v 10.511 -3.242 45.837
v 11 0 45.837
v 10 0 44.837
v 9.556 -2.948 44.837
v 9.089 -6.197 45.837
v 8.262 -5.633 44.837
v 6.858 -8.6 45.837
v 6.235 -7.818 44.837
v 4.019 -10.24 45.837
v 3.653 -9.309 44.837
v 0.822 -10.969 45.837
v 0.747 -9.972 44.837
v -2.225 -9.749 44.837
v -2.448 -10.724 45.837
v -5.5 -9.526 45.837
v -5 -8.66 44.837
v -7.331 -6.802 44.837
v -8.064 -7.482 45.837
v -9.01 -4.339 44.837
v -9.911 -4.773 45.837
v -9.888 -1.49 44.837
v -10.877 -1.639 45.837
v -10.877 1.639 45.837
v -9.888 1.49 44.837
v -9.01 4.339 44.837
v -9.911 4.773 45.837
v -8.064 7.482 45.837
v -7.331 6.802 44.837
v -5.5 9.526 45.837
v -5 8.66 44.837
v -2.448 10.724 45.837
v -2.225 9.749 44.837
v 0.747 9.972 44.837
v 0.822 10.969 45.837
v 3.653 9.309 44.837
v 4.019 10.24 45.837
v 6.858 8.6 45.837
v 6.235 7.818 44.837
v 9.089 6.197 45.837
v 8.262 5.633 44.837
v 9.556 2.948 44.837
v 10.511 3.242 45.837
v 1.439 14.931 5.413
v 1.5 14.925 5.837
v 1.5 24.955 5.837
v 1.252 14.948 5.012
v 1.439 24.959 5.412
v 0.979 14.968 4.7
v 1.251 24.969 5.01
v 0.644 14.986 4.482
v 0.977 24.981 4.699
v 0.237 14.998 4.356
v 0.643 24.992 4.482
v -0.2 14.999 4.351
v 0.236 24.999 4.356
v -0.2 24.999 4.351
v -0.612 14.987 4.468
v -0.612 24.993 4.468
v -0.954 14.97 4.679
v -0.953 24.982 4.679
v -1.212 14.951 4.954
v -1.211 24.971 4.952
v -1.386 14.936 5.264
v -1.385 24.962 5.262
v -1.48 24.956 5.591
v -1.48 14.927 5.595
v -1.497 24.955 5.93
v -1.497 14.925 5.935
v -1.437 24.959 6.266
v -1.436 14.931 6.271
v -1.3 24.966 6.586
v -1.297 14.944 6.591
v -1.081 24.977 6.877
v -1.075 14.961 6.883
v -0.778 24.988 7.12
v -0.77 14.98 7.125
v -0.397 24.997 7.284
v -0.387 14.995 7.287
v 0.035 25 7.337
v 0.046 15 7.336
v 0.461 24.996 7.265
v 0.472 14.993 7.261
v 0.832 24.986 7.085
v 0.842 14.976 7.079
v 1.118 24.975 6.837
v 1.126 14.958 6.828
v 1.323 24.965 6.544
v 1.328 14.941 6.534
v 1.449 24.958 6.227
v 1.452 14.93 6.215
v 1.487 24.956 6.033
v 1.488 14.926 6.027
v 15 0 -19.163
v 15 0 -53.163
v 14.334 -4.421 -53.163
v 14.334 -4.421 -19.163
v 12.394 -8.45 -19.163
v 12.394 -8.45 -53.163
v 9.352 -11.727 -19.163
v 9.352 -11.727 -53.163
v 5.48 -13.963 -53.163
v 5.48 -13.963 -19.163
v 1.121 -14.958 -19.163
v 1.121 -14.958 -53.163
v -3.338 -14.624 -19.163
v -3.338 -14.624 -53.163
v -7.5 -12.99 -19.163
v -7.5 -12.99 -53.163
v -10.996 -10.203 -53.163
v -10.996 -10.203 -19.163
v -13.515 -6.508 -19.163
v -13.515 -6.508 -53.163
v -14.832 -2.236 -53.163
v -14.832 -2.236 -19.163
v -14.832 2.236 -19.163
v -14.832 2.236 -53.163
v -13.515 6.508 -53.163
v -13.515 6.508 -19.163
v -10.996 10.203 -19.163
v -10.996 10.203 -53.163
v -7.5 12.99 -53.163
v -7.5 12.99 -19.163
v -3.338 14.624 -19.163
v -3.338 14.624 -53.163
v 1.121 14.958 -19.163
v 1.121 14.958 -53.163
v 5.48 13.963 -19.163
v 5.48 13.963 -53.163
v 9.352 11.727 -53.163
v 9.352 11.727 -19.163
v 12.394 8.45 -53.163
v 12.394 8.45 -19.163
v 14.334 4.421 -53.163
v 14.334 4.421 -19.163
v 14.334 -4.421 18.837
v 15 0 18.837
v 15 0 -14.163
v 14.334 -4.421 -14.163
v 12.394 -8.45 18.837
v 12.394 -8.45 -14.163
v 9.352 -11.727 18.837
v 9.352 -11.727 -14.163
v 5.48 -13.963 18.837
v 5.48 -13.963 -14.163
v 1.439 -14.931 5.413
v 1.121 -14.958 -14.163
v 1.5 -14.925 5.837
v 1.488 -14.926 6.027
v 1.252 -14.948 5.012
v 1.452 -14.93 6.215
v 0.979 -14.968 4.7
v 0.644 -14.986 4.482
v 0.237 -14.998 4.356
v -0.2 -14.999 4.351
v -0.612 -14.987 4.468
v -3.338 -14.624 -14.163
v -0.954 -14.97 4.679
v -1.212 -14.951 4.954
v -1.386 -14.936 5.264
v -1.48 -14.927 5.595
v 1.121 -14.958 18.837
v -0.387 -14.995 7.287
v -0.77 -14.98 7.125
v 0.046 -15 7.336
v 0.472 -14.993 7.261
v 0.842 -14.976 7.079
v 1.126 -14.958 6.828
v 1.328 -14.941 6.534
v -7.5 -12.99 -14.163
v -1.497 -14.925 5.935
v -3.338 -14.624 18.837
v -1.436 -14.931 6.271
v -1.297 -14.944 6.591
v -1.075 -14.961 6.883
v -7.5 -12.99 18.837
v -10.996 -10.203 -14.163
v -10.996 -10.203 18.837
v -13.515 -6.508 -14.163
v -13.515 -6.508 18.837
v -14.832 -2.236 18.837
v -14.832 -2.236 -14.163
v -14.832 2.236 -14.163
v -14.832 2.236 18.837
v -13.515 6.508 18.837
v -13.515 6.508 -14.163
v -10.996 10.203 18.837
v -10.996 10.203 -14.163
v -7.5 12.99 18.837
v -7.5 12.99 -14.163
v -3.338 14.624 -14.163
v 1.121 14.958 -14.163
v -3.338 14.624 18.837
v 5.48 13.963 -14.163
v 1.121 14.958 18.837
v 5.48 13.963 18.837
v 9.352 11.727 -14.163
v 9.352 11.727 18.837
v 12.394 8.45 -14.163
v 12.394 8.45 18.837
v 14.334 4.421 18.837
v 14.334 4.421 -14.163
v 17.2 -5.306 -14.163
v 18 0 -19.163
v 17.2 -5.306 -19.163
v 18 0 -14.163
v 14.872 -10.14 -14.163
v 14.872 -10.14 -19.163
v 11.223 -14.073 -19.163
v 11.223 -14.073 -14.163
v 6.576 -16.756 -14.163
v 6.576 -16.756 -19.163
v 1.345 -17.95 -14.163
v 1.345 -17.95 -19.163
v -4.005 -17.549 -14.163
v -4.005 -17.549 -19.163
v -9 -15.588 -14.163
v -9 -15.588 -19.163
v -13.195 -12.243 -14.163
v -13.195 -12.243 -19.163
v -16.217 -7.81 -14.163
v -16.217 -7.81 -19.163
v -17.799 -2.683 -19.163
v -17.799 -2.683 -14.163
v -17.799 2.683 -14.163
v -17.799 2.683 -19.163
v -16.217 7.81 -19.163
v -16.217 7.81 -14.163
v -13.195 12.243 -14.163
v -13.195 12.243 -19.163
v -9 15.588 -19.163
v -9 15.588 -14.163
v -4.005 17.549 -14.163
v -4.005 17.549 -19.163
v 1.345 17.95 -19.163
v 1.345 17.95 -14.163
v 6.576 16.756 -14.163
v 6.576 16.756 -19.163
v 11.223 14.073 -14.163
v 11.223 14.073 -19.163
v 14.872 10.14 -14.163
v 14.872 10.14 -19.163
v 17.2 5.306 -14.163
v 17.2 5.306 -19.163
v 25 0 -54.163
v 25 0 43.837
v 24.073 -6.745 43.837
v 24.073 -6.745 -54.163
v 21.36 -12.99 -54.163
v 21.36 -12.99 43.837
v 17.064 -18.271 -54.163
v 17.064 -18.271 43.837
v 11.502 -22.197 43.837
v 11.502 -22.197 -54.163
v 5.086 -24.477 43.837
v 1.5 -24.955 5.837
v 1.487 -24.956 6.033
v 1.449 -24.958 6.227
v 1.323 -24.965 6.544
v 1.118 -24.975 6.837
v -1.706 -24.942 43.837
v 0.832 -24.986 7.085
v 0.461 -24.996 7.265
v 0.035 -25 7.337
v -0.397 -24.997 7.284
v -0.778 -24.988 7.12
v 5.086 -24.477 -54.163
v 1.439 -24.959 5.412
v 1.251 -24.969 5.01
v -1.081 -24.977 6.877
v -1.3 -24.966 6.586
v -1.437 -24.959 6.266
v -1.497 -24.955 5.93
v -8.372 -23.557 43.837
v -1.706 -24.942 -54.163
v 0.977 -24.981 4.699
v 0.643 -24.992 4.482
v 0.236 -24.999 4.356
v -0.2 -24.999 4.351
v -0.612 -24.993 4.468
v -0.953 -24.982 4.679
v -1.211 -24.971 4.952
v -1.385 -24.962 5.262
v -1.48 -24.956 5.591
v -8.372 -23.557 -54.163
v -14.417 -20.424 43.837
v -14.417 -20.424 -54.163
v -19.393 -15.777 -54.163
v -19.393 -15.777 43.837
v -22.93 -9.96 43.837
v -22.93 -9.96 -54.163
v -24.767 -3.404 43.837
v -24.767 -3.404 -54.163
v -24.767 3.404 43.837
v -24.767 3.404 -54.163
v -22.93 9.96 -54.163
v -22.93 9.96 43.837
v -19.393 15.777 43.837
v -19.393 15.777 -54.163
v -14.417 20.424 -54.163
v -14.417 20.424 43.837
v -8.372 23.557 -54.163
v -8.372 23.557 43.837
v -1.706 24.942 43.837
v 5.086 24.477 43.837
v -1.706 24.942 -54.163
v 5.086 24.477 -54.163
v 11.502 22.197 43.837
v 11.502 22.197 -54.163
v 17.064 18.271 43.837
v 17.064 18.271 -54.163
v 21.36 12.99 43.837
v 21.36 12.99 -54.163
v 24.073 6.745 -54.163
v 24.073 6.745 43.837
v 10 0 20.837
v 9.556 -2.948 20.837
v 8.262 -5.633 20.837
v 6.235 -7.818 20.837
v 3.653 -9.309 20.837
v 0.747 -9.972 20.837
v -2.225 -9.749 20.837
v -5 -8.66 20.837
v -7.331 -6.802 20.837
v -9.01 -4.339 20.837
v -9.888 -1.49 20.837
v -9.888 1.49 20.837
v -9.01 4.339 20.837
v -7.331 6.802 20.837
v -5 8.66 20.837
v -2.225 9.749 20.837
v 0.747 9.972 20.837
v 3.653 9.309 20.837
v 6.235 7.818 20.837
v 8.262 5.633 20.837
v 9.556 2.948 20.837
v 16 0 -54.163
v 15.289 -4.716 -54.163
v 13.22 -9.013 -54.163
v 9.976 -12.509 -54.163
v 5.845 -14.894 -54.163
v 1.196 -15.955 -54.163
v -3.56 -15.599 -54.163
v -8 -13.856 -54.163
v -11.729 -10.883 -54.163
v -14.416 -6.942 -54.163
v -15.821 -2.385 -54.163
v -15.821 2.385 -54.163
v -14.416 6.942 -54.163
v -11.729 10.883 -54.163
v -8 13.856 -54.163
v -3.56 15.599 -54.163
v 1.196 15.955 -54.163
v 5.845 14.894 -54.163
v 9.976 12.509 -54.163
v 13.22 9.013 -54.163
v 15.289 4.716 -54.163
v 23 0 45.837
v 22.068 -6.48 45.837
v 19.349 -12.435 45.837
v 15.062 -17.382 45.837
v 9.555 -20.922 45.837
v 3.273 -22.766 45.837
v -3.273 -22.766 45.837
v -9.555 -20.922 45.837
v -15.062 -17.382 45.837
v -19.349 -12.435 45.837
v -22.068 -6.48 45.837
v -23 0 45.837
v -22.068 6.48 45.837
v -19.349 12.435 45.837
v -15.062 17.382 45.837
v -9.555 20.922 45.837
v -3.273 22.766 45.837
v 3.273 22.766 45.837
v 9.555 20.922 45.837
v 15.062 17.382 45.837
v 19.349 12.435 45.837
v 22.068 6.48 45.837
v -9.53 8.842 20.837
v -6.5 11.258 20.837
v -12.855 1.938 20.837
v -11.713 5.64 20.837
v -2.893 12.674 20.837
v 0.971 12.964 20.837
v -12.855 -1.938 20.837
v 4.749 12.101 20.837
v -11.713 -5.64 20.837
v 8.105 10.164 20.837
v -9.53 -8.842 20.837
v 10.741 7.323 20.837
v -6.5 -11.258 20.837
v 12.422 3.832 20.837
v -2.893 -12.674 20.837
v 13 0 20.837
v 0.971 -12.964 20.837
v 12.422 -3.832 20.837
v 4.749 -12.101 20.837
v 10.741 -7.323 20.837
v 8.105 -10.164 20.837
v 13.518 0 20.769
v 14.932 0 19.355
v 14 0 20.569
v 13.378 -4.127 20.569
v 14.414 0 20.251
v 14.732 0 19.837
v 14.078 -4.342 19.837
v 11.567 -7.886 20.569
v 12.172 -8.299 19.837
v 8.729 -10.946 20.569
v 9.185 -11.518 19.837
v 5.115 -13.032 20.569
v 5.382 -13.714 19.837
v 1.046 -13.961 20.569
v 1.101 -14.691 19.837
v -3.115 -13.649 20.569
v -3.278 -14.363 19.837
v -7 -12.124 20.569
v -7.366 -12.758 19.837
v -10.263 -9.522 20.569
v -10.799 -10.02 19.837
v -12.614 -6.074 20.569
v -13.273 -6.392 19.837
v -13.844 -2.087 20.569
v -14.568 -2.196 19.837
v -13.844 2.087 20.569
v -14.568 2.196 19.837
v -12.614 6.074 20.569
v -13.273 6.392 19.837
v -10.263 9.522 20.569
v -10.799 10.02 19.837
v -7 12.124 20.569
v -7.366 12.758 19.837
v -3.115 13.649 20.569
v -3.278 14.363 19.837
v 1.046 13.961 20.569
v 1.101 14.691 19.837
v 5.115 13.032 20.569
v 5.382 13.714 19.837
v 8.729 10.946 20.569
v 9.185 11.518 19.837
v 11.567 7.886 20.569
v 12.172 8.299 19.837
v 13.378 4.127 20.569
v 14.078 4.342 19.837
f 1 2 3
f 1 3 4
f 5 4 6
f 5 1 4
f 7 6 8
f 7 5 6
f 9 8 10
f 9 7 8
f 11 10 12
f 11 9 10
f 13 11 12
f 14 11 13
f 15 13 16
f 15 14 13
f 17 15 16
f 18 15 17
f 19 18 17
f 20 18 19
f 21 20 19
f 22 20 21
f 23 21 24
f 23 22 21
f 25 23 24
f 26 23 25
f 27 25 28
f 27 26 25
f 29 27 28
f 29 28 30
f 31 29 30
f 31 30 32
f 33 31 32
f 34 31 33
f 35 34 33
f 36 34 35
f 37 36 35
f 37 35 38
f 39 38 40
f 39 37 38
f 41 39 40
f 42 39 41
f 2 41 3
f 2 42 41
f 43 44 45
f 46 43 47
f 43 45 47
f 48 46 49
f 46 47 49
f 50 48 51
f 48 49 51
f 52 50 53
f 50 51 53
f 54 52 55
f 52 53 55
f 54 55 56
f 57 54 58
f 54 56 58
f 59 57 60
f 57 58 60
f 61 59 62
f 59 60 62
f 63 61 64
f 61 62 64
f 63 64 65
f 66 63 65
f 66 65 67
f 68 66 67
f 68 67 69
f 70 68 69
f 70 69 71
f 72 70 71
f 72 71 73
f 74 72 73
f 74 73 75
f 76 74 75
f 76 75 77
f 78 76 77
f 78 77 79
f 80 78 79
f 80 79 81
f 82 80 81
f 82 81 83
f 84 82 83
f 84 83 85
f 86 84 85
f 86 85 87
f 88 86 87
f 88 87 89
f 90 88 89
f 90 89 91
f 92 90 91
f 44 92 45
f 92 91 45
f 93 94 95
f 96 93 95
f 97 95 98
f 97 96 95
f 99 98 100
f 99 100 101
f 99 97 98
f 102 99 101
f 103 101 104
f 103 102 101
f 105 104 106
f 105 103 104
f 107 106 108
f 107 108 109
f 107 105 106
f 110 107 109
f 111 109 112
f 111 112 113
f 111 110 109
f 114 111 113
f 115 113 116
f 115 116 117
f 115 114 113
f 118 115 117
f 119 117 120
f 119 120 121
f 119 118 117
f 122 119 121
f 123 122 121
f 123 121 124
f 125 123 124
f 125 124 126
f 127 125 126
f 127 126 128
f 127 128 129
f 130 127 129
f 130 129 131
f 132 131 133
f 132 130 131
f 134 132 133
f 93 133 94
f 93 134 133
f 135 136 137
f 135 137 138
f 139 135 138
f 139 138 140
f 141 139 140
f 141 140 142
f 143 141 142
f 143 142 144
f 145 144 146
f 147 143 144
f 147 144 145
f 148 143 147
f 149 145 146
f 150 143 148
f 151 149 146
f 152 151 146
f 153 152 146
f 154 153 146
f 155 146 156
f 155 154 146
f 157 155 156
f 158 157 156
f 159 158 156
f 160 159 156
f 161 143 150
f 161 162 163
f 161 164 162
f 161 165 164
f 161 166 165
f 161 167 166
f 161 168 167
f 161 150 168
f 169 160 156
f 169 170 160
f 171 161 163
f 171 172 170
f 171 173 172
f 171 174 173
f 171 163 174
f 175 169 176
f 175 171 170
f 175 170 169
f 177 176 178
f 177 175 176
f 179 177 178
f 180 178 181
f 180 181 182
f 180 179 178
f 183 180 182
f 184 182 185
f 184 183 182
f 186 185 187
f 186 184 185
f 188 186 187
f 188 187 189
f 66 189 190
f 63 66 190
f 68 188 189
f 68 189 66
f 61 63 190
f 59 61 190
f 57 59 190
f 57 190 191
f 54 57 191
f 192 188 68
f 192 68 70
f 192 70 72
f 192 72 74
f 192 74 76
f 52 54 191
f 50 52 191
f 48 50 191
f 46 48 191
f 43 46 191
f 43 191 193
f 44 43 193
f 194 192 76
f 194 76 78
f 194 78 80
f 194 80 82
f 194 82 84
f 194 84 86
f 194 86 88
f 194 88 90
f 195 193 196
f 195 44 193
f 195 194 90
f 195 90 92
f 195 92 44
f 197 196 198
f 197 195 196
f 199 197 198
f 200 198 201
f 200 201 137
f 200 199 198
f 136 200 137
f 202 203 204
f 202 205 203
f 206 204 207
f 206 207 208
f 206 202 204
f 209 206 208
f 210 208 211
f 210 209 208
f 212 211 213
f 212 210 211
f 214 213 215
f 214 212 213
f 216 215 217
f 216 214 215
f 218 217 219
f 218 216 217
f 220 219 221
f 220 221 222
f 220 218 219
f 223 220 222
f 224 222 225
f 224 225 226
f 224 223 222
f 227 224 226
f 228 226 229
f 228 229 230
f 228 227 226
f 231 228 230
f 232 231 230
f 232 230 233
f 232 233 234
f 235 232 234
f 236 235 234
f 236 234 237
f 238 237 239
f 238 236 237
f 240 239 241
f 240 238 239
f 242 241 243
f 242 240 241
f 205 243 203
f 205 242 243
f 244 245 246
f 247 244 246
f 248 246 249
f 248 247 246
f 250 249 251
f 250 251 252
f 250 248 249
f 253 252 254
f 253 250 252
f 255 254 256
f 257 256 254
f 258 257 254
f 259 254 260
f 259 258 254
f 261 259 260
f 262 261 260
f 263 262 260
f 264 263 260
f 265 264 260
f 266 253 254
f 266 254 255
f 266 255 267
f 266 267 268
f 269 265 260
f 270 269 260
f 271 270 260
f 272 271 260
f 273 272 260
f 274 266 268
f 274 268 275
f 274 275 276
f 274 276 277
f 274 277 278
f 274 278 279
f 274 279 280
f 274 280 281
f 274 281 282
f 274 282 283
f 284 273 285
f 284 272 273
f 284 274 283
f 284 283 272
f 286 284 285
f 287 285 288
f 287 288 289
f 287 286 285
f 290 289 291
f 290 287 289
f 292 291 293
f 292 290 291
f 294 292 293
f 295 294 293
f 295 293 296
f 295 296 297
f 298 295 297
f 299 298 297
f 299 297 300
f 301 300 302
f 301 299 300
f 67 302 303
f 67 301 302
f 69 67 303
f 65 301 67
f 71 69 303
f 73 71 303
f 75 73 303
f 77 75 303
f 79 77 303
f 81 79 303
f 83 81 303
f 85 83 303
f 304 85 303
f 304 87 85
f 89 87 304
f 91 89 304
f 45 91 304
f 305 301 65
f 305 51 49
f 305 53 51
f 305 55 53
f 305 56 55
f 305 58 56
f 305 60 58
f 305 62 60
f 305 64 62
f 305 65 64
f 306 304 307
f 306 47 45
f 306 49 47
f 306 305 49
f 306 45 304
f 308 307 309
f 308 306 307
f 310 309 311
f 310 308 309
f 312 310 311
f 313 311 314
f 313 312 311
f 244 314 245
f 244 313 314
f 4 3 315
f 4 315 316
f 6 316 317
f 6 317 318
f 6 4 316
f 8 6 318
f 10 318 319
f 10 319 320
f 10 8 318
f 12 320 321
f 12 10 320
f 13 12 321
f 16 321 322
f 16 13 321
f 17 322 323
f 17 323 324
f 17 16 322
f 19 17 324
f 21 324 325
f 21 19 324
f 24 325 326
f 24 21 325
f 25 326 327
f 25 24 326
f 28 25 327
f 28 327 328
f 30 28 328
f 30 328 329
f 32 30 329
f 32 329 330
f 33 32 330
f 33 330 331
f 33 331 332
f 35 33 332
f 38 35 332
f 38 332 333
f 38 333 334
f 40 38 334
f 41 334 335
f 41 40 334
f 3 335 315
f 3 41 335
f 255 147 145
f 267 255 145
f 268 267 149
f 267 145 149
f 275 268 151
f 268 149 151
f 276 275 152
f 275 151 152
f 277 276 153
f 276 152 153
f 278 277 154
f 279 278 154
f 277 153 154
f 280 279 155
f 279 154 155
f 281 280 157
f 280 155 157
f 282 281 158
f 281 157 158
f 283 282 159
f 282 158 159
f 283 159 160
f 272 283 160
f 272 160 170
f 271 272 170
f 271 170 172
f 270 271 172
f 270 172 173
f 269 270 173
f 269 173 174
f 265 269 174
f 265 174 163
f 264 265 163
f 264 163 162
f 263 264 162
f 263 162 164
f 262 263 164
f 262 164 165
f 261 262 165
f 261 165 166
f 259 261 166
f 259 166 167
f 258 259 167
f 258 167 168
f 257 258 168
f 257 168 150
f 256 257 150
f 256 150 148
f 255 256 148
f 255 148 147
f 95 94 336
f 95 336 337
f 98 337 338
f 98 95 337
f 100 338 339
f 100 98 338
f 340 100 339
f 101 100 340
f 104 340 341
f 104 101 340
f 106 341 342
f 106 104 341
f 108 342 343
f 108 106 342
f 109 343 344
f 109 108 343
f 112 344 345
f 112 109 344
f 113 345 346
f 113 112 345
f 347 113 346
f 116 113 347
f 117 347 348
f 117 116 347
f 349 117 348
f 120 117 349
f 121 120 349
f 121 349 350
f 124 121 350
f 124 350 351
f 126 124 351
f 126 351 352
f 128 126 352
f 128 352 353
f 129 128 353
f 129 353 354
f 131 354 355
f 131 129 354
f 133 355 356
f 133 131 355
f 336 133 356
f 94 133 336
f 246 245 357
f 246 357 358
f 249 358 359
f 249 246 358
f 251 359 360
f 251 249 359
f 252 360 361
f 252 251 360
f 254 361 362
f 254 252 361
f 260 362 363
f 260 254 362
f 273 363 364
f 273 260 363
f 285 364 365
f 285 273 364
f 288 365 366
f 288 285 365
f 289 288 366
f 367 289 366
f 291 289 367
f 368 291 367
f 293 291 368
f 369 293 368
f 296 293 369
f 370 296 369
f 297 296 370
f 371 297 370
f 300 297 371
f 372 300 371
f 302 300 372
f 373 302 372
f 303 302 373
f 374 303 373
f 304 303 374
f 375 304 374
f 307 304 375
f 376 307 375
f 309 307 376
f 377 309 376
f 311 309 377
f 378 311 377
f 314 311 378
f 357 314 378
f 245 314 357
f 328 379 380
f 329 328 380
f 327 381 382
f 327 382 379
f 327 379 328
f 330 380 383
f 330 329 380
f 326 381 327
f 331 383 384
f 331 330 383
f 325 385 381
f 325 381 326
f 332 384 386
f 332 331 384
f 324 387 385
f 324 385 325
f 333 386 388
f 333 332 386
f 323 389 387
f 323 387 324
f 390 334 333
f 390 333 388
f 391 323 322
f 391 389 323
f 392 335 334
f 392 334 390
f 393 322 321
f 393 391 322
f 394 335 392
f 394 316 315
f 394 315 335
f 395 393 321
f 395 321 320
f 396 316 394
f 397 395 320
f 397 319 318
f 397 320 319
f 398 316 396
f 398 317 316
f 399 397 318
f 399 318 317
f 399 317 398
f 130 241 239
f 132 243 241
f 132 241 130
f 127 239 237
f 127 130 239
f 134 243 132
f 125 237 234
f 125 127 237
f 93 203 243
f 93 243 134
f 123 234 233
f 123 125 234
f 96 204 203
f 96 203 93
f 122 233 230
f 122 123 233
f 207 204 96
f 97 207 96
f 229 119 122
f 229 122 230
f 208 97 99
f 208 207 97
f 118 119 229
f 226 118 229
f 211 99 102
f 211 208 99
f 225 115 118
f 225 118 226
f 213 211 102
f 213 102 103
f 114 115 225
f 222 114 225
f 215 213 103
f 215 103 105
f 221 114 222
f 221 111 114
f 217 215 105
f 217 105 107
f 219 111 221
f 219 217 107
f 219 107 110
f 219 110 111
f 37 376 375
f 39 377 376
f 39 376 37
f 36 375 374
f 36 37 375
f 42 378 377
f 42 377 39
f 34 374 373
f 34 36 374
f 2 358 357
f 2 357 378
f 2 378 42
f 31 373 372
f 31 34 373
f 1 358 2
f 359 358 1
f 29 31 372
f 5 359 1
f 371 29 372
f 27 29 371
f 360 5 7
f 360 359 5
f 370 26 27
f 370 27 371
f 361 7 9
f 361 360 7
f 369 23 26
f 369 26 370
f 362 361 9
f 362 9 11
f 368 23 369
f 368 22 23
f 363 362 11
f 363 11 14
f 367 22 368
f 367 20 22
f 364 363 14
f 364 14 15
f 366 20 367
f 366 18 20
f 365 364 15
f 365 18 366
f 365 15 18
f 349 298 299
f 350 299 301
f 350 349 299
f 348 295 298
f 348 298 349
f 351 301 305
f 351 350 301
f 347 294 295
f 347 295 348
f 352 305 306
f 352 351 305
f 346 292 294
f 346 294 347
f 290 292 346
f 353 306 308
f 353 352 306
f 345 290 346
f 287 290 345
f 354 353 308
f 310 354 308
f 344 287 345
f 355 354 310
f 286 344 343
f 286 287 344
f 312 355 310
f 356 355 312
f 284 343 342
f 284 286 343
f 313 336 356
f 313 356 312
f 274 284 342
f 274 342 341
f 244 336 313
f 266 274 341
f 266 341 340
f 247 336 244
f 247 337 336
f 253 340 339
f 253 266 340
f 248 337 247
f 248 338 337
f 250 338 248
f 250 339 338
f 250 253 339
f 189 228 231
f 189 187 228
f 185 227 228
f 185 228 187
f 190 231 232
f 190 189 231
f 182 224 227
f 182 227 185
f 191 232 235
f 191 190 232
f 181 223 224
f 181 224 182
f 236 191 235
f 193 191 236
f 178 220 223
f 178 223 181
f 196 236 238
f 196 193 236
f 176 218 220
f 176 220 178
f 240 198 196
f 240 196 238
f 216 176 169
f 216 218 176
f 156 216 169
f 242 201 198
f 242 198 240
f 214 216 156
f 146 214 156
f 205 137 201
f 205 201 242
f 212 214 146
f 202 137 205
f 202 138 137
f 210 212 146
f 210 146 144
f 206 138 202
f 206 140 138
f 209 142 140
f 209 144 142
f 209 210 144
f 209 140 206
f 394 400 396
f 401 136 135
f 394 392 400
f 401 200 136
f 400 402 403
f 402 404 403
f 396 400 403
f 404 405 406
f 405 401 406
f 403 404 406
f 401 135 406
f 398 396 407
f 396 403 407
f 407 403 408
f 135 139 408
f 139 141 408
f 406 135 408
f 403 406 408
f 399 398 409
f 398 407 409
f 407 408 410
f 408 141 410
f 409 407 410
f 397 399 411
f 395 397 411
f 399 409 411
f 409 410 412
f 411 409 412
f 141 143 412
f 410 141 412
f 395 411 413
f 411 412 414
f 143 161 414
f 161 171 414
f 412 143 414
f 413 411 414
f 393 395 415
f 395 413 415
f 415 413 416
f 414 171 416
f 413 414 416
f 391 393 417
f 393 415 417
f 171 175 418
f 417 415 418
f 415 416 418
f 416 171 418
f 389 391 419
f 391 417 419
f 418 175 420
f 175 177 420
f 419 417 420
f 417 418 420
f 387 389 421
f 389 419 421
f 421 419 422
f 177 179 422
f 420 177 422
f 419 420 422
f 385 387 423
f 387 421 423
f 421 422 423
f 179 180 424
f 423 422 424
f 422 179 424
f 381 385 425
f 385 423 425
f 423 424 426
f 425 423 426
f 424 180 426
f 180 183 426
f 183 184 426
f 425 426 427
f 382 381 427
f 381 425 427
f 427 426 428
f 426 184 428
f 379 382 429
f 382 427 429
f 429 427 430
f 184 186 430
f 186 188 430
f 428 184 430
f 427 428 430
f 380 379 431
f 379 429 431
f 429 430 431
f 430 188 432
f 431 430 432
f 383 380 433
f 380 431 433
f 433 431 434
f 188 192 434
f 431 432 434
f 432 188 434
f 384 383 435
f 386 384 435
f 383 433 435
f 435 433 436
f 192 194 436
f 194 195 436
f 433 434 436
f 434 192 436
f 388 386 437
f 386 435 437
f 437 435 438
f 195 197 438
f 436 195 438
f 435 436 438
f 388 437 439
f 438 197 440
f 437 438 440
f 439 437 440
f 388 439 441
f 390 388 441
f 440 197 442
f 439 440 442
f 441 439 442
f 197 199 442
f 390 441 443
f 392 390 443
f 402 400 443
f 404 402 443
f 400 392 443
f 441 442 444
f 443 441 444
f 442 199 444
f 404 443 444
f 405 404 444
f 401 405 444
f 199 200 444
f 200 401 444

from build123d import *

# Parameters (mm, degrees)
SMUSSO1_SIZE   = 1
SMUSSO2_SIZE   = 2
RACCORDO1_R    = 2
FORO_3_0_3_1_D = 3


with BuildPart() as part:
    # Schizzo1 → Rivoluzione1 (revolve)
    with BuildSketch(Plane(origin=(0, 0, 0), x_dir=(0, 0, -1), z_dir=(1, 0, 0)), mode=Mode.PRIVATE) as rivoluzione1_sk:
        Polygon((-20.837168328, 15), (-20.837168328, 10), (-45.837168328, 10), (-45.837168328, 25), (54.162831672, 25), (54.162831672, 15), (19.162831672, 15), (19.162831672, 18), (14.162831672, 18), (14.162831672, 15), align=None)
    revolve(rivoluzione1_sk.sketch.rotate(Axis((0, 0, 55.346650187), (0, 0, -1)), 90), axis=Axis((0, 0, 55.346650187), (0, 0, -1)))

    # Smusso1
    smusso1_edges = [part.edges().sort_by_distance(p)[0] for p in [
        (-15, 0, -54.162831672),
        (-10, 0, 45.837168328),
    ]]
    chamfer(smusso1_edges, length=SMUSSO1_SIZE)

    # Smusso2
    smusso2_edges = [part.edges().sort_by_distance(p)[0] for p in [
        (-25, 0, 45.837168328),
    ]]
    chamfer(smusso2_edges, length=SMUSSO2_SIZE)

    # Raccordo1
    raccordo1_edges = [part.edges().sort_by_distance(p)[0] for p in [
        (-15, 0, 20.837168328),
    ]]
    fillet(raccordo1_edges, radius=RACCORDO1_R)

    # Foro Ø3.0 (3)-1 (through all)
    with Locations(Plane(origin=(0, -25, 0), x_dir=(-1, 0, 0), z_dir=(0, -1, 0))):
        with Locations((0, -5.837168328)):
            Hole(FORO_3_0_3_1_D / 2)


solid = part.part
